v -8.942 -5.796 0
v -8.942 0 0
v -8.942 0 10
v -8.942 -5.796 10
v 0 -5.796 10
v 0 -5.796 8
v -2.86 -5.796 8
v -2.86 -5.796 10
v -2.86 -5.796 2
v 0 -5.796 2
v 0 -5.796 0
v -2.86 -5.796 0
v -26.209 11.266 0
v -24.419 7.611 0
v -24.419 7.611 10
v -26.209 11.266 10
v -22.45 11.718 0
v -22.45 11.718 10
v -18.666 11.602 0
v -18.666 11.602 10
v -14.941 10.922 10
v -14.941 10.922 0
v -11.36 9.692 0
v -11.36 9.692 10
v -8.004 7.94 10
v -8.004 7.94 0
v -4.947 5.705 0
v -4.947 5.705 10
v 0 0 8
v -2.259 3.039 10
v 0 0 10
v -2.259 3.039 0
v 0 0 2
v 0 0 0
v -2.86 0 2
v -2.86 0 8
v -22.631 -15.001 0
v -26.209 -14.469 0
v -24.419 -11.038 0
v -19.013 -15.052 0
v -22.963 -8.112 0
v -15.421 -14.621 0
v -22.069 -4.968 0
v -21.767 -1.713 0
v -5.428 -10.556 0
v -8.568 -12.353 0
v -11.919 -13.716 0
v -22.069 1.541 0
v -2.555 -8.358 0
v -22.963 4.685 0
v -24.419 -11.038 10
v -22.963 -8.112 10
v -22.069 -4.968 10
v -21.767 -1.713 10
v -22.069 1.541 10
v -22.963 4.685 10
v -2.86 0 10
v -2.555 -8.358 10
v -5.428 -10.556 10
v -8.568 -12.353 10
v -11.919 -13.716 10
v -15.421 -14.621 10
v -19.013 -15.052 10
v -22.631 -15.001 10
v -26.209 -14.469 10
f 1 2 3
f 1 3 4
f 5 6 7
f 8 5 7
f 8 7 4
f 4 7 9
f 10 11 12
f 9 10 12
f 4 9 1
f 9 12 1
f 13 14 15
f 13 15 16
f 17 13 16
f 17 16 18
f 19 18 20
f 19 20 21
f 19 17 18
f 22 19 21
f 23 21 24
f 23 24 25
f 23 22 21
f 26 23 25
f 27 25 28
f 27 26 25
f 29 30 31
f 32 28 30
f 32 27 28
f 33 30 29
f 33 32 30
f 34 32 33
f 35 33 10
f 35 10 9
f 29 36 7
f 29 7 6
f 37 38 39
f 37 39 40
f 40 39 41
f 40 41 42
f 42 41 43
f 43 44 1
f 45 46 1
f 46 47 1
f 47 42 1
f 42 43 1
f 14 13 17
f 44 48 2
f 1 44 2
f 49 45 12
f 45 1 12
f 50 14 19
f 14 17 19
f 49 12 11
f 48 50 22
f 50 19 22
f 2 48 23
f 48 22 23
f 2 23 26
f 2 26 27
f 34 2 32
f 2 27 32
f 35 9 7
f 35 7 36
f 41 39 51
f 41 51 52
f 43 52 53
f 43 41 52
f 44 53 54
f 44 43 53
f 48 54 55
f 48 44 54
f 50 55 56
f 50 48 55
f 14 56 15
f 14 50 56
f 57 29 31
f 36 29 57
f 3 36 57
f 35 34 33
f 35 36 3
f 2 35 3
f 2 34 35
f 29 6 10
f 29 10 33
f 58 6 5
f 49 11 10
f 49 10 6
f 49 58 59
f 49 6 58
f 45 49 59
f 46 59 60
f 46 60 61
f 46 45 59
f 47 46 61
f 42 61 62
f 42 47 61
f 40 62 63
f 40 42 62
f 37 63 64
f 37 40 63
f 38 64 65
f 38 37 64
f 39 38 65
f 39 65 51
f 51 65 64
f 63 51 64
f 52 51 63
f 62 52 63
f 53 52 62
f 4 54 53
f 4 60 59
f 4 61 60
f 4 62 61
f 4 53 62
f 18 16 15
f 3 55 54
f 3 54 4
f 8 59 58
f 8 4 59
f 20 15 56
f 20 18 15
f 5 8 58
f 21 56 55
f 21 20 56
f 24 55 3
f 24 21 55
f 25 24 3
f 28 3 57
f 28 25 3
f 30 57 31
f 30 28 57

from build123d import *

# Parameters (mm, degrees)
EXTRUDE_1_DEPTH     = 10
SKETCH_2_W          = 2.859550618
SKETCH_2_H          = 5.796062829
EXTRUDE_2_DEPTH     = 10
SKETCH_11_W         = 2.859550618
SKETCH_11_H         = 5.796062829
CUT_EXTRUDE_8_DEPTH = 2
SKETCH_12_W         = 2.859550618
SKETCH_12_H         = 5.796062829
CUT_EXTRUDE_9_DEPTH = 2


with BuildPart() as part:
    # 草圖1 → 填料-伸長1 (new body)
    with BuildSketch(Plane.XY):
        with BuildLine():
            Line((0, 0), (-8.942496936, 0))
            Line((-8.942496936, 0), (-8.942496936, -5.796062829))
            Line((-8.942496936, -5.796062829), (0, -5.796062829))
            ThreePointArc((0, -5.796062829), (-11.918722494, -13.716380039), (-26.209286831, -14.469468031))
            Line((-26.209286831, -14.469468031), (-24.418965375, -11.038018573))
            ThreePointArc((-24.418965375, -11.038018573), (-21.767209123, -1.713427654), (-24.418965375, 7.611163265))
            Line((-24.418965375, 7.611163265), (-26.209286831, 11.266402905))
            ThreePointArc((-26.209286831, 11.266402905), (-11.360125695, 9.691512317), (0, 0))
        make_face()
    extrude(amount=EXTRUDE_1_DEPTH)

    # 草圖2 → 填料-伸長2 (add)
    with BuildSketch(Plane.XY):
        with Locations((-1.429775309, -2.898031415)):
            Rectangle(SKETCH_2_W, SKETCH_2_H)
    extrude(amount=EXTRUDE_2_DEPTH)

    # 草圖11 → 除料-伸長8 (cut)
    with BuildSketch(Plane.XY.offset(10)):
        with Locations((-1.429775309, -2.898031415)):
            Rectangle(SKETCH_11_W, SKETCH_11_H)
    extrude(amount=-CUT_EXTRUDE_8_DEPTH, mode=Mode.SUBTRACT)

    # 草圖12 → 除料-伸長9 (cut)
    with BuildSketch(Plane(origin=(0, 0, 0), x_dir=(-1, 0, 0), z_dir=(0, 0, -1))):
        with Locations((1.429775309, -2.898031415)):
            Rectangle(SKETCH_12_W, SKETCH_12_H)
    extrude(amount=-CUT_EXTRUDE_9_DEPTH, mode=Mode.SUBTRACT)


solid = part.part
